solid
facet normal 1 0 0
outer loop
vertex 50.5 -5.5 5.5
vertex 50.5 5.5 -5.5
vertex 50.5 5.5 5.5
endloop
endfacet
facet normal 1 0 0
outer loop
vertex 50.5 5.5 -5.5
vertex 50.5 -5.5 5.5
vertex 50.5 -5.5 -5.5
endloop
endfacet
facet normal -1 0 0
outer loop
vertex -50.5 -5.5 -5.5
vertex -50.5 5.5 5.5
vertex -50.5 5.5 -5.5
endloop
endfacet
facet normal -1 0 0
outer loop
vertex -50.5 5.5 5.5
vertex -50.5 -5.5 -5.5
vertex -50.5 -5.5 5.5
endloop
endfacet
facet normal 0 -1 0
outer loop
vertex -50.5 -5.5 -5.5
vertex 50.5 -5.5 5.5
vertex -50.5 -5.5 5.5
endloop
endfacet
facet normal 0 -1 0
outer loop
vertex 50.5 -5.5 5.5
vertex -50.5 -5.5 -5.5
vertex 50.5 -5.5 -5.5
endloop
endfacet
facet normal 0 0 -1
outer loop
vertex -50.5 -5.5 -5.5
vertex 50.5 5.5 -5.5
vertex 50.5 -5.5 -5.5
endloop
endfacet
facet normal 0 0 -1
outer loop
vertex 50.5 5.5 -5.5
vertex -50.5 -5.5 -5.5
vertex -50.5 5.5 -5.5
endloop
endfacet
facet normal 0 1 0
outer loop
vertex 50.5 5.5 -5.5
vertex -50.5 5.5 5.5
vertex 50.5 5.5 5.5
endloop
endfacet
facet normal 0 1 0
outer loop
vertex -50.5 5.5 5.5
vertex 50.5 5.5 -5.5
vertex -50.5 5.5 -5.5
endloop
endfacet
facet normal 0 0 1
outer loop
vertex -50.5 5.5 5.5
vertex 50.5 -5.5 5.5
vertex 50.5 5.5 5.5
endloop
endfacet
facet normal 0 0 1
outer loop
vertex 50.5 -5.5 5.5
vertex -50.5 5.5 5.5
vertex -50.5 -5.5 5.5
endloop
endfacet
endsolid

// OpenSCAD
// file: base.scad
// Base function and modules for all cases

// Create [x, y, z] copies of the object 
// placed according to the step vector
module array(n_copies, step = [10,10,10], center = true)
{
    translation = (center) ? [for(i = [0:2])
            (n_copies[i] - 1) * step[i] / -2] : [0, 0, 0];
    translate(translation)
    union() {
        for (i_x = [0:n_copies[0] - 1]) {
            for (i_y = [0:n_copies[1] - 1]) {
                for (i_z = [0:n_copies[2] - 1]) {
                    translate([i_x*step[0], i_y*step[1], 
                        i_z*step[2]]) children();
                }
            }
        }
    }
}

module mirrorcp(arg) {
    children();
    mirror(arg) children();
}

module rotatecp(arg) {
    children();
    rotate(arg) children();
}

module placeclone(points) {
    union() {
        for (p = points) {
            translate(p) children();
        }
    } 
}

// cylinder with ellipse profile
module ellipse_cylinder(h = 1, rx = 1, ry = 1)
{
    scale([rx, ry, h]) cylinder(h = 1, r = 1, center = true);
}

// rectangular triangle
module rect_triangle(x = 1, y = 1)
{
    polygon(points = [[x, 0], [0, 0], [0, y]]);
}

// isosceles triangle
// set two out of three parameters
module iso_triangle(base = undef, height = undef, angle = undef)
{
    b = (base > 0) ? base : 2 * height / tan(angle);
    h = (height > 0) ? height : base * tan(angle) / 2;
    a = (angle > 0) ? angle : atan2(h, b/2);
    polygon(points = [[-b/2, 0], [0, h], [b/2, 0]]); 
}

// hexagon. Width for nut wrench.
module hexagon(width)
{
    size = width / sqrt(3);
    polygon(points = [for(a = [0:60:360]) [size*cos(a+30), size*sin(a+30)]]);
}

// octogon. Width - from rib to rib
module octogon(width)
{
    size = 0.5 * width / cos(45/2);
    polygon(points = [for(a = [0:45:360]) [size*cos(a+45/2), size*sin(a+45/2)]]);
}

// torus(outer_d, inner_d)
module torus(outer_d, inner_d, convexity = 10)
{
    rotate_extrude(convexity = convexity)
    translate([outer_d/2, 0, 0])
    circle(d = inner_d);
}

// isosceles trapezium
// set three out of four parameters
module iso_trapezium(bottom = undef, top = undef, height = undef, angle = undef)
{
    b = (bottom > 0) ? bottom : top + 2 * height / tan(angle);
    t = (top > 0) ? top : bottom - 2 * height / tan(angle);
    h = (height > 0) ? height : abs(bottom - top) * tan(angle) / 2;
    a = (angle > 0) ? angle : atan2(h, abs(bottom - top) / 2);
    polygon(points = [[-b/2, 0], [-t/2, h], [t/2, h], [b/2, 0]]);
}

// create prism from polygon
module prism(h = 1, center = true)
{
    linear_extrude(height = h, center = center, scale = 1.0)
    {
        children();
    }
}


// rectangular triangle prism
// size = [x, y, z] - 2 legs and depth
// dir - direction of normal to triangle plane
module rect_triangle_prism(size = [1, 1, 1])
{
    linear_extrude(height = size[2], center = true, scale = 1.0)
    {
        rect_triangle(x = size[0], y = size[1]);
    }
}

// Circular plane sector
// angle > 0!
module sector2d(diameter, angle)
{
    support_point = (angle < 90) ? [0, 2*diameter] :
                    (angle < 270) ? [-2*diameter, 0] :
                    [0, -2*diameter];
    difference() {
        circle(d=diameter);
        polygon(points = [[0, 0], [2*diameter, 0], [2*diameter, -3*diameter], 
            [-4*diameter, -3*diameter], support_point,
            [diameter*cos(angle), diameter*sin(angle)]]);
        
    }
}

// Bow - base on sector2d
// Pos - bow position related to diameter. Can be "o" = outer, "i" = inner, "c" = center
module bow2d(diameter, angle, width, pos = "c")
{
    d_offset = (pos == "o") ? width : (pos == "i") ? -width : 0;
    d1 = diameter + width + d_offset;
    d2 = d1 - 2*width;
    difference() {
        sector2d(d1, angle);
        sector2d(d2, 360);
    }
}

// Bow - bow2d by two points - beginning and ending of bow.
// Pos - bow position related to points. Can be "o" = outer, "i" = inner, "c" = center
// Use switch to choose another bow part
module bow2d2p(point_begin, point_end, bow_r, width, switch = true, pos = "c", ext_angle = 0)
{
    dx = point_begin[0];
    dy = point_end[1];
    circle_center = [circle_center_x(point_end[0] - dx, point_begin[1] - dy, bow_r), circle_center_y(point_end[0] - dx, point_begin[1] - dy, bow_r)] + [dx, dy];
    az_begin = vector_az2d(point_begin - circle_center);
    az_end = vector_az2d(point_end - circle_center);
    az1 = (switch) ? min(az_begin, az_end) : max(az_begin, az_end);
    az2 = (switch) ? max(az_begin, az_end) : min(az_begin, az_end);
    bow_a = (az2 > az1) ? az2-az1: 360 + (az2 - az1);
    echo(az1 = az1); echo(dx = dx); echo(dy = dy);
    echo(az2 = az2); echo(az_begin = az_begin); echo(az_end = az_end);
    echo(circle_center = circle_center);

    translate([circle_center[0], circle_center[1], 0])
    rotate([0, 0, az1 - ext_angle])
    bow2d(abs(bow_r)*2, bow_a + 2*ext_angle, width, pos);
}

function vector_az2d(v) = atan2(v[1], v[0]);

function rotate_vector(a, v)
    = [[1,0,0],[0,cos(a[0]),-sin(a[0])],[0,sin(a[0]),cos(a[0])]]
    * [[cos(a[1]),0,sin(a[1])],[0,1,0],[-sin(a[1]),0,cos(a[1])]]
    * [[cos(a[2]),-sin(a[2]),0],[sin(a[2]),cos(a[2]),0],[0,0,1]] * v;

function circle_center_root(x, y, r) = sign(r) * sqrt(pow(r,2) / (pow(y,2) + pow(x,2)) - 0.25);
function circle_center_x(x, y, r) = y * circle_center_root(x, y, r) + x/2;
function circle_center_y(x, y, r) = x * circle_center_root(x, y, r) + y/2;


module bevel_cube(cube_vec, bevel)
{
    intersection() {
        intersection() {
            intersection() {
                cube(cube_vec, center = true);
                scale([1, cube_vec[1]/cube_vec[0],1])
                cylinder(d=cube_vec[0]*sqrt(2)-bevel*2, h = cube_vec[2]+1,center=true);
            }
            rotate([90,0,0])
            scale([1, cube_vec[2]/cube_vec[0],1])
            cylinder(d=cube_vec[0]*sqrt(2)-bevel*2, h = cube_vec[1]+1,center=true);
        }
        rotate([0,90,0])
        scale([1, cube_vec[2]/cube_vec[1],1])
        cylinder(d=cube_vec[1]*sqrt(2)-bevel*2, h = cube_vec[0]+1,center=true);
    }
}
// main file
// Leading Profiles
use <base.scad>;

module square_profile(size, length = 100, dir = "x", pos = [0, 0, 0], 
    backlash = 0.1)
{
    cube_size = (len(size) == undef) ? [size, size, length] :
                (len(size) == 1) ? [size[0], size[0], length] :
                [size[0], size[1], length];
    rotation = (dir == "x") ? [0, 90, 0] :
               (dir == "y") ? [90, 0, 0] :
               [0, 0, 0];
    backlash_vec = [backlash, backlash, backlash];
    translate(pos) rotate(rotation) 
        cube(cube_size + backlash_vec, center = true);
}

// Key hole. Parameters: outer cylinder diameter, total height, 
// base width, base-to-cylinder angle, hole diameter, total length
module key_hole(d = 1, h = 2, base = 1, angle = 45, hole = 0, length = 1)
{
    trap_h = h - d/2;
    difference() {
        union() {
            prism(h = length) iso_trapezium(bottom = base, height = trap_h, angle = angle);
            translate([0, trap_h, 0])
                cylinder(r = d/2, h = length, center = true);
        }
        translate([0, trap_h, 0])
            cylinder(r = hole/2, h = length + 0.01, center = true);
    }
}

// Square channel. w - width, h - height, btm_th - bottom thickness, side_th - side_thickness, l - length
module square_channel(h = 10, w = 10, btm_th = 1, side_th = 1, l = 1)
{
    difference() {
        cube([l, w, h], center = true);
        translate([0, 0, btm_th]) cube([l + 0.01, w - side_th*2, h + 0.01], center = true);
    }
}

square_profile(10, backlash = 1);
